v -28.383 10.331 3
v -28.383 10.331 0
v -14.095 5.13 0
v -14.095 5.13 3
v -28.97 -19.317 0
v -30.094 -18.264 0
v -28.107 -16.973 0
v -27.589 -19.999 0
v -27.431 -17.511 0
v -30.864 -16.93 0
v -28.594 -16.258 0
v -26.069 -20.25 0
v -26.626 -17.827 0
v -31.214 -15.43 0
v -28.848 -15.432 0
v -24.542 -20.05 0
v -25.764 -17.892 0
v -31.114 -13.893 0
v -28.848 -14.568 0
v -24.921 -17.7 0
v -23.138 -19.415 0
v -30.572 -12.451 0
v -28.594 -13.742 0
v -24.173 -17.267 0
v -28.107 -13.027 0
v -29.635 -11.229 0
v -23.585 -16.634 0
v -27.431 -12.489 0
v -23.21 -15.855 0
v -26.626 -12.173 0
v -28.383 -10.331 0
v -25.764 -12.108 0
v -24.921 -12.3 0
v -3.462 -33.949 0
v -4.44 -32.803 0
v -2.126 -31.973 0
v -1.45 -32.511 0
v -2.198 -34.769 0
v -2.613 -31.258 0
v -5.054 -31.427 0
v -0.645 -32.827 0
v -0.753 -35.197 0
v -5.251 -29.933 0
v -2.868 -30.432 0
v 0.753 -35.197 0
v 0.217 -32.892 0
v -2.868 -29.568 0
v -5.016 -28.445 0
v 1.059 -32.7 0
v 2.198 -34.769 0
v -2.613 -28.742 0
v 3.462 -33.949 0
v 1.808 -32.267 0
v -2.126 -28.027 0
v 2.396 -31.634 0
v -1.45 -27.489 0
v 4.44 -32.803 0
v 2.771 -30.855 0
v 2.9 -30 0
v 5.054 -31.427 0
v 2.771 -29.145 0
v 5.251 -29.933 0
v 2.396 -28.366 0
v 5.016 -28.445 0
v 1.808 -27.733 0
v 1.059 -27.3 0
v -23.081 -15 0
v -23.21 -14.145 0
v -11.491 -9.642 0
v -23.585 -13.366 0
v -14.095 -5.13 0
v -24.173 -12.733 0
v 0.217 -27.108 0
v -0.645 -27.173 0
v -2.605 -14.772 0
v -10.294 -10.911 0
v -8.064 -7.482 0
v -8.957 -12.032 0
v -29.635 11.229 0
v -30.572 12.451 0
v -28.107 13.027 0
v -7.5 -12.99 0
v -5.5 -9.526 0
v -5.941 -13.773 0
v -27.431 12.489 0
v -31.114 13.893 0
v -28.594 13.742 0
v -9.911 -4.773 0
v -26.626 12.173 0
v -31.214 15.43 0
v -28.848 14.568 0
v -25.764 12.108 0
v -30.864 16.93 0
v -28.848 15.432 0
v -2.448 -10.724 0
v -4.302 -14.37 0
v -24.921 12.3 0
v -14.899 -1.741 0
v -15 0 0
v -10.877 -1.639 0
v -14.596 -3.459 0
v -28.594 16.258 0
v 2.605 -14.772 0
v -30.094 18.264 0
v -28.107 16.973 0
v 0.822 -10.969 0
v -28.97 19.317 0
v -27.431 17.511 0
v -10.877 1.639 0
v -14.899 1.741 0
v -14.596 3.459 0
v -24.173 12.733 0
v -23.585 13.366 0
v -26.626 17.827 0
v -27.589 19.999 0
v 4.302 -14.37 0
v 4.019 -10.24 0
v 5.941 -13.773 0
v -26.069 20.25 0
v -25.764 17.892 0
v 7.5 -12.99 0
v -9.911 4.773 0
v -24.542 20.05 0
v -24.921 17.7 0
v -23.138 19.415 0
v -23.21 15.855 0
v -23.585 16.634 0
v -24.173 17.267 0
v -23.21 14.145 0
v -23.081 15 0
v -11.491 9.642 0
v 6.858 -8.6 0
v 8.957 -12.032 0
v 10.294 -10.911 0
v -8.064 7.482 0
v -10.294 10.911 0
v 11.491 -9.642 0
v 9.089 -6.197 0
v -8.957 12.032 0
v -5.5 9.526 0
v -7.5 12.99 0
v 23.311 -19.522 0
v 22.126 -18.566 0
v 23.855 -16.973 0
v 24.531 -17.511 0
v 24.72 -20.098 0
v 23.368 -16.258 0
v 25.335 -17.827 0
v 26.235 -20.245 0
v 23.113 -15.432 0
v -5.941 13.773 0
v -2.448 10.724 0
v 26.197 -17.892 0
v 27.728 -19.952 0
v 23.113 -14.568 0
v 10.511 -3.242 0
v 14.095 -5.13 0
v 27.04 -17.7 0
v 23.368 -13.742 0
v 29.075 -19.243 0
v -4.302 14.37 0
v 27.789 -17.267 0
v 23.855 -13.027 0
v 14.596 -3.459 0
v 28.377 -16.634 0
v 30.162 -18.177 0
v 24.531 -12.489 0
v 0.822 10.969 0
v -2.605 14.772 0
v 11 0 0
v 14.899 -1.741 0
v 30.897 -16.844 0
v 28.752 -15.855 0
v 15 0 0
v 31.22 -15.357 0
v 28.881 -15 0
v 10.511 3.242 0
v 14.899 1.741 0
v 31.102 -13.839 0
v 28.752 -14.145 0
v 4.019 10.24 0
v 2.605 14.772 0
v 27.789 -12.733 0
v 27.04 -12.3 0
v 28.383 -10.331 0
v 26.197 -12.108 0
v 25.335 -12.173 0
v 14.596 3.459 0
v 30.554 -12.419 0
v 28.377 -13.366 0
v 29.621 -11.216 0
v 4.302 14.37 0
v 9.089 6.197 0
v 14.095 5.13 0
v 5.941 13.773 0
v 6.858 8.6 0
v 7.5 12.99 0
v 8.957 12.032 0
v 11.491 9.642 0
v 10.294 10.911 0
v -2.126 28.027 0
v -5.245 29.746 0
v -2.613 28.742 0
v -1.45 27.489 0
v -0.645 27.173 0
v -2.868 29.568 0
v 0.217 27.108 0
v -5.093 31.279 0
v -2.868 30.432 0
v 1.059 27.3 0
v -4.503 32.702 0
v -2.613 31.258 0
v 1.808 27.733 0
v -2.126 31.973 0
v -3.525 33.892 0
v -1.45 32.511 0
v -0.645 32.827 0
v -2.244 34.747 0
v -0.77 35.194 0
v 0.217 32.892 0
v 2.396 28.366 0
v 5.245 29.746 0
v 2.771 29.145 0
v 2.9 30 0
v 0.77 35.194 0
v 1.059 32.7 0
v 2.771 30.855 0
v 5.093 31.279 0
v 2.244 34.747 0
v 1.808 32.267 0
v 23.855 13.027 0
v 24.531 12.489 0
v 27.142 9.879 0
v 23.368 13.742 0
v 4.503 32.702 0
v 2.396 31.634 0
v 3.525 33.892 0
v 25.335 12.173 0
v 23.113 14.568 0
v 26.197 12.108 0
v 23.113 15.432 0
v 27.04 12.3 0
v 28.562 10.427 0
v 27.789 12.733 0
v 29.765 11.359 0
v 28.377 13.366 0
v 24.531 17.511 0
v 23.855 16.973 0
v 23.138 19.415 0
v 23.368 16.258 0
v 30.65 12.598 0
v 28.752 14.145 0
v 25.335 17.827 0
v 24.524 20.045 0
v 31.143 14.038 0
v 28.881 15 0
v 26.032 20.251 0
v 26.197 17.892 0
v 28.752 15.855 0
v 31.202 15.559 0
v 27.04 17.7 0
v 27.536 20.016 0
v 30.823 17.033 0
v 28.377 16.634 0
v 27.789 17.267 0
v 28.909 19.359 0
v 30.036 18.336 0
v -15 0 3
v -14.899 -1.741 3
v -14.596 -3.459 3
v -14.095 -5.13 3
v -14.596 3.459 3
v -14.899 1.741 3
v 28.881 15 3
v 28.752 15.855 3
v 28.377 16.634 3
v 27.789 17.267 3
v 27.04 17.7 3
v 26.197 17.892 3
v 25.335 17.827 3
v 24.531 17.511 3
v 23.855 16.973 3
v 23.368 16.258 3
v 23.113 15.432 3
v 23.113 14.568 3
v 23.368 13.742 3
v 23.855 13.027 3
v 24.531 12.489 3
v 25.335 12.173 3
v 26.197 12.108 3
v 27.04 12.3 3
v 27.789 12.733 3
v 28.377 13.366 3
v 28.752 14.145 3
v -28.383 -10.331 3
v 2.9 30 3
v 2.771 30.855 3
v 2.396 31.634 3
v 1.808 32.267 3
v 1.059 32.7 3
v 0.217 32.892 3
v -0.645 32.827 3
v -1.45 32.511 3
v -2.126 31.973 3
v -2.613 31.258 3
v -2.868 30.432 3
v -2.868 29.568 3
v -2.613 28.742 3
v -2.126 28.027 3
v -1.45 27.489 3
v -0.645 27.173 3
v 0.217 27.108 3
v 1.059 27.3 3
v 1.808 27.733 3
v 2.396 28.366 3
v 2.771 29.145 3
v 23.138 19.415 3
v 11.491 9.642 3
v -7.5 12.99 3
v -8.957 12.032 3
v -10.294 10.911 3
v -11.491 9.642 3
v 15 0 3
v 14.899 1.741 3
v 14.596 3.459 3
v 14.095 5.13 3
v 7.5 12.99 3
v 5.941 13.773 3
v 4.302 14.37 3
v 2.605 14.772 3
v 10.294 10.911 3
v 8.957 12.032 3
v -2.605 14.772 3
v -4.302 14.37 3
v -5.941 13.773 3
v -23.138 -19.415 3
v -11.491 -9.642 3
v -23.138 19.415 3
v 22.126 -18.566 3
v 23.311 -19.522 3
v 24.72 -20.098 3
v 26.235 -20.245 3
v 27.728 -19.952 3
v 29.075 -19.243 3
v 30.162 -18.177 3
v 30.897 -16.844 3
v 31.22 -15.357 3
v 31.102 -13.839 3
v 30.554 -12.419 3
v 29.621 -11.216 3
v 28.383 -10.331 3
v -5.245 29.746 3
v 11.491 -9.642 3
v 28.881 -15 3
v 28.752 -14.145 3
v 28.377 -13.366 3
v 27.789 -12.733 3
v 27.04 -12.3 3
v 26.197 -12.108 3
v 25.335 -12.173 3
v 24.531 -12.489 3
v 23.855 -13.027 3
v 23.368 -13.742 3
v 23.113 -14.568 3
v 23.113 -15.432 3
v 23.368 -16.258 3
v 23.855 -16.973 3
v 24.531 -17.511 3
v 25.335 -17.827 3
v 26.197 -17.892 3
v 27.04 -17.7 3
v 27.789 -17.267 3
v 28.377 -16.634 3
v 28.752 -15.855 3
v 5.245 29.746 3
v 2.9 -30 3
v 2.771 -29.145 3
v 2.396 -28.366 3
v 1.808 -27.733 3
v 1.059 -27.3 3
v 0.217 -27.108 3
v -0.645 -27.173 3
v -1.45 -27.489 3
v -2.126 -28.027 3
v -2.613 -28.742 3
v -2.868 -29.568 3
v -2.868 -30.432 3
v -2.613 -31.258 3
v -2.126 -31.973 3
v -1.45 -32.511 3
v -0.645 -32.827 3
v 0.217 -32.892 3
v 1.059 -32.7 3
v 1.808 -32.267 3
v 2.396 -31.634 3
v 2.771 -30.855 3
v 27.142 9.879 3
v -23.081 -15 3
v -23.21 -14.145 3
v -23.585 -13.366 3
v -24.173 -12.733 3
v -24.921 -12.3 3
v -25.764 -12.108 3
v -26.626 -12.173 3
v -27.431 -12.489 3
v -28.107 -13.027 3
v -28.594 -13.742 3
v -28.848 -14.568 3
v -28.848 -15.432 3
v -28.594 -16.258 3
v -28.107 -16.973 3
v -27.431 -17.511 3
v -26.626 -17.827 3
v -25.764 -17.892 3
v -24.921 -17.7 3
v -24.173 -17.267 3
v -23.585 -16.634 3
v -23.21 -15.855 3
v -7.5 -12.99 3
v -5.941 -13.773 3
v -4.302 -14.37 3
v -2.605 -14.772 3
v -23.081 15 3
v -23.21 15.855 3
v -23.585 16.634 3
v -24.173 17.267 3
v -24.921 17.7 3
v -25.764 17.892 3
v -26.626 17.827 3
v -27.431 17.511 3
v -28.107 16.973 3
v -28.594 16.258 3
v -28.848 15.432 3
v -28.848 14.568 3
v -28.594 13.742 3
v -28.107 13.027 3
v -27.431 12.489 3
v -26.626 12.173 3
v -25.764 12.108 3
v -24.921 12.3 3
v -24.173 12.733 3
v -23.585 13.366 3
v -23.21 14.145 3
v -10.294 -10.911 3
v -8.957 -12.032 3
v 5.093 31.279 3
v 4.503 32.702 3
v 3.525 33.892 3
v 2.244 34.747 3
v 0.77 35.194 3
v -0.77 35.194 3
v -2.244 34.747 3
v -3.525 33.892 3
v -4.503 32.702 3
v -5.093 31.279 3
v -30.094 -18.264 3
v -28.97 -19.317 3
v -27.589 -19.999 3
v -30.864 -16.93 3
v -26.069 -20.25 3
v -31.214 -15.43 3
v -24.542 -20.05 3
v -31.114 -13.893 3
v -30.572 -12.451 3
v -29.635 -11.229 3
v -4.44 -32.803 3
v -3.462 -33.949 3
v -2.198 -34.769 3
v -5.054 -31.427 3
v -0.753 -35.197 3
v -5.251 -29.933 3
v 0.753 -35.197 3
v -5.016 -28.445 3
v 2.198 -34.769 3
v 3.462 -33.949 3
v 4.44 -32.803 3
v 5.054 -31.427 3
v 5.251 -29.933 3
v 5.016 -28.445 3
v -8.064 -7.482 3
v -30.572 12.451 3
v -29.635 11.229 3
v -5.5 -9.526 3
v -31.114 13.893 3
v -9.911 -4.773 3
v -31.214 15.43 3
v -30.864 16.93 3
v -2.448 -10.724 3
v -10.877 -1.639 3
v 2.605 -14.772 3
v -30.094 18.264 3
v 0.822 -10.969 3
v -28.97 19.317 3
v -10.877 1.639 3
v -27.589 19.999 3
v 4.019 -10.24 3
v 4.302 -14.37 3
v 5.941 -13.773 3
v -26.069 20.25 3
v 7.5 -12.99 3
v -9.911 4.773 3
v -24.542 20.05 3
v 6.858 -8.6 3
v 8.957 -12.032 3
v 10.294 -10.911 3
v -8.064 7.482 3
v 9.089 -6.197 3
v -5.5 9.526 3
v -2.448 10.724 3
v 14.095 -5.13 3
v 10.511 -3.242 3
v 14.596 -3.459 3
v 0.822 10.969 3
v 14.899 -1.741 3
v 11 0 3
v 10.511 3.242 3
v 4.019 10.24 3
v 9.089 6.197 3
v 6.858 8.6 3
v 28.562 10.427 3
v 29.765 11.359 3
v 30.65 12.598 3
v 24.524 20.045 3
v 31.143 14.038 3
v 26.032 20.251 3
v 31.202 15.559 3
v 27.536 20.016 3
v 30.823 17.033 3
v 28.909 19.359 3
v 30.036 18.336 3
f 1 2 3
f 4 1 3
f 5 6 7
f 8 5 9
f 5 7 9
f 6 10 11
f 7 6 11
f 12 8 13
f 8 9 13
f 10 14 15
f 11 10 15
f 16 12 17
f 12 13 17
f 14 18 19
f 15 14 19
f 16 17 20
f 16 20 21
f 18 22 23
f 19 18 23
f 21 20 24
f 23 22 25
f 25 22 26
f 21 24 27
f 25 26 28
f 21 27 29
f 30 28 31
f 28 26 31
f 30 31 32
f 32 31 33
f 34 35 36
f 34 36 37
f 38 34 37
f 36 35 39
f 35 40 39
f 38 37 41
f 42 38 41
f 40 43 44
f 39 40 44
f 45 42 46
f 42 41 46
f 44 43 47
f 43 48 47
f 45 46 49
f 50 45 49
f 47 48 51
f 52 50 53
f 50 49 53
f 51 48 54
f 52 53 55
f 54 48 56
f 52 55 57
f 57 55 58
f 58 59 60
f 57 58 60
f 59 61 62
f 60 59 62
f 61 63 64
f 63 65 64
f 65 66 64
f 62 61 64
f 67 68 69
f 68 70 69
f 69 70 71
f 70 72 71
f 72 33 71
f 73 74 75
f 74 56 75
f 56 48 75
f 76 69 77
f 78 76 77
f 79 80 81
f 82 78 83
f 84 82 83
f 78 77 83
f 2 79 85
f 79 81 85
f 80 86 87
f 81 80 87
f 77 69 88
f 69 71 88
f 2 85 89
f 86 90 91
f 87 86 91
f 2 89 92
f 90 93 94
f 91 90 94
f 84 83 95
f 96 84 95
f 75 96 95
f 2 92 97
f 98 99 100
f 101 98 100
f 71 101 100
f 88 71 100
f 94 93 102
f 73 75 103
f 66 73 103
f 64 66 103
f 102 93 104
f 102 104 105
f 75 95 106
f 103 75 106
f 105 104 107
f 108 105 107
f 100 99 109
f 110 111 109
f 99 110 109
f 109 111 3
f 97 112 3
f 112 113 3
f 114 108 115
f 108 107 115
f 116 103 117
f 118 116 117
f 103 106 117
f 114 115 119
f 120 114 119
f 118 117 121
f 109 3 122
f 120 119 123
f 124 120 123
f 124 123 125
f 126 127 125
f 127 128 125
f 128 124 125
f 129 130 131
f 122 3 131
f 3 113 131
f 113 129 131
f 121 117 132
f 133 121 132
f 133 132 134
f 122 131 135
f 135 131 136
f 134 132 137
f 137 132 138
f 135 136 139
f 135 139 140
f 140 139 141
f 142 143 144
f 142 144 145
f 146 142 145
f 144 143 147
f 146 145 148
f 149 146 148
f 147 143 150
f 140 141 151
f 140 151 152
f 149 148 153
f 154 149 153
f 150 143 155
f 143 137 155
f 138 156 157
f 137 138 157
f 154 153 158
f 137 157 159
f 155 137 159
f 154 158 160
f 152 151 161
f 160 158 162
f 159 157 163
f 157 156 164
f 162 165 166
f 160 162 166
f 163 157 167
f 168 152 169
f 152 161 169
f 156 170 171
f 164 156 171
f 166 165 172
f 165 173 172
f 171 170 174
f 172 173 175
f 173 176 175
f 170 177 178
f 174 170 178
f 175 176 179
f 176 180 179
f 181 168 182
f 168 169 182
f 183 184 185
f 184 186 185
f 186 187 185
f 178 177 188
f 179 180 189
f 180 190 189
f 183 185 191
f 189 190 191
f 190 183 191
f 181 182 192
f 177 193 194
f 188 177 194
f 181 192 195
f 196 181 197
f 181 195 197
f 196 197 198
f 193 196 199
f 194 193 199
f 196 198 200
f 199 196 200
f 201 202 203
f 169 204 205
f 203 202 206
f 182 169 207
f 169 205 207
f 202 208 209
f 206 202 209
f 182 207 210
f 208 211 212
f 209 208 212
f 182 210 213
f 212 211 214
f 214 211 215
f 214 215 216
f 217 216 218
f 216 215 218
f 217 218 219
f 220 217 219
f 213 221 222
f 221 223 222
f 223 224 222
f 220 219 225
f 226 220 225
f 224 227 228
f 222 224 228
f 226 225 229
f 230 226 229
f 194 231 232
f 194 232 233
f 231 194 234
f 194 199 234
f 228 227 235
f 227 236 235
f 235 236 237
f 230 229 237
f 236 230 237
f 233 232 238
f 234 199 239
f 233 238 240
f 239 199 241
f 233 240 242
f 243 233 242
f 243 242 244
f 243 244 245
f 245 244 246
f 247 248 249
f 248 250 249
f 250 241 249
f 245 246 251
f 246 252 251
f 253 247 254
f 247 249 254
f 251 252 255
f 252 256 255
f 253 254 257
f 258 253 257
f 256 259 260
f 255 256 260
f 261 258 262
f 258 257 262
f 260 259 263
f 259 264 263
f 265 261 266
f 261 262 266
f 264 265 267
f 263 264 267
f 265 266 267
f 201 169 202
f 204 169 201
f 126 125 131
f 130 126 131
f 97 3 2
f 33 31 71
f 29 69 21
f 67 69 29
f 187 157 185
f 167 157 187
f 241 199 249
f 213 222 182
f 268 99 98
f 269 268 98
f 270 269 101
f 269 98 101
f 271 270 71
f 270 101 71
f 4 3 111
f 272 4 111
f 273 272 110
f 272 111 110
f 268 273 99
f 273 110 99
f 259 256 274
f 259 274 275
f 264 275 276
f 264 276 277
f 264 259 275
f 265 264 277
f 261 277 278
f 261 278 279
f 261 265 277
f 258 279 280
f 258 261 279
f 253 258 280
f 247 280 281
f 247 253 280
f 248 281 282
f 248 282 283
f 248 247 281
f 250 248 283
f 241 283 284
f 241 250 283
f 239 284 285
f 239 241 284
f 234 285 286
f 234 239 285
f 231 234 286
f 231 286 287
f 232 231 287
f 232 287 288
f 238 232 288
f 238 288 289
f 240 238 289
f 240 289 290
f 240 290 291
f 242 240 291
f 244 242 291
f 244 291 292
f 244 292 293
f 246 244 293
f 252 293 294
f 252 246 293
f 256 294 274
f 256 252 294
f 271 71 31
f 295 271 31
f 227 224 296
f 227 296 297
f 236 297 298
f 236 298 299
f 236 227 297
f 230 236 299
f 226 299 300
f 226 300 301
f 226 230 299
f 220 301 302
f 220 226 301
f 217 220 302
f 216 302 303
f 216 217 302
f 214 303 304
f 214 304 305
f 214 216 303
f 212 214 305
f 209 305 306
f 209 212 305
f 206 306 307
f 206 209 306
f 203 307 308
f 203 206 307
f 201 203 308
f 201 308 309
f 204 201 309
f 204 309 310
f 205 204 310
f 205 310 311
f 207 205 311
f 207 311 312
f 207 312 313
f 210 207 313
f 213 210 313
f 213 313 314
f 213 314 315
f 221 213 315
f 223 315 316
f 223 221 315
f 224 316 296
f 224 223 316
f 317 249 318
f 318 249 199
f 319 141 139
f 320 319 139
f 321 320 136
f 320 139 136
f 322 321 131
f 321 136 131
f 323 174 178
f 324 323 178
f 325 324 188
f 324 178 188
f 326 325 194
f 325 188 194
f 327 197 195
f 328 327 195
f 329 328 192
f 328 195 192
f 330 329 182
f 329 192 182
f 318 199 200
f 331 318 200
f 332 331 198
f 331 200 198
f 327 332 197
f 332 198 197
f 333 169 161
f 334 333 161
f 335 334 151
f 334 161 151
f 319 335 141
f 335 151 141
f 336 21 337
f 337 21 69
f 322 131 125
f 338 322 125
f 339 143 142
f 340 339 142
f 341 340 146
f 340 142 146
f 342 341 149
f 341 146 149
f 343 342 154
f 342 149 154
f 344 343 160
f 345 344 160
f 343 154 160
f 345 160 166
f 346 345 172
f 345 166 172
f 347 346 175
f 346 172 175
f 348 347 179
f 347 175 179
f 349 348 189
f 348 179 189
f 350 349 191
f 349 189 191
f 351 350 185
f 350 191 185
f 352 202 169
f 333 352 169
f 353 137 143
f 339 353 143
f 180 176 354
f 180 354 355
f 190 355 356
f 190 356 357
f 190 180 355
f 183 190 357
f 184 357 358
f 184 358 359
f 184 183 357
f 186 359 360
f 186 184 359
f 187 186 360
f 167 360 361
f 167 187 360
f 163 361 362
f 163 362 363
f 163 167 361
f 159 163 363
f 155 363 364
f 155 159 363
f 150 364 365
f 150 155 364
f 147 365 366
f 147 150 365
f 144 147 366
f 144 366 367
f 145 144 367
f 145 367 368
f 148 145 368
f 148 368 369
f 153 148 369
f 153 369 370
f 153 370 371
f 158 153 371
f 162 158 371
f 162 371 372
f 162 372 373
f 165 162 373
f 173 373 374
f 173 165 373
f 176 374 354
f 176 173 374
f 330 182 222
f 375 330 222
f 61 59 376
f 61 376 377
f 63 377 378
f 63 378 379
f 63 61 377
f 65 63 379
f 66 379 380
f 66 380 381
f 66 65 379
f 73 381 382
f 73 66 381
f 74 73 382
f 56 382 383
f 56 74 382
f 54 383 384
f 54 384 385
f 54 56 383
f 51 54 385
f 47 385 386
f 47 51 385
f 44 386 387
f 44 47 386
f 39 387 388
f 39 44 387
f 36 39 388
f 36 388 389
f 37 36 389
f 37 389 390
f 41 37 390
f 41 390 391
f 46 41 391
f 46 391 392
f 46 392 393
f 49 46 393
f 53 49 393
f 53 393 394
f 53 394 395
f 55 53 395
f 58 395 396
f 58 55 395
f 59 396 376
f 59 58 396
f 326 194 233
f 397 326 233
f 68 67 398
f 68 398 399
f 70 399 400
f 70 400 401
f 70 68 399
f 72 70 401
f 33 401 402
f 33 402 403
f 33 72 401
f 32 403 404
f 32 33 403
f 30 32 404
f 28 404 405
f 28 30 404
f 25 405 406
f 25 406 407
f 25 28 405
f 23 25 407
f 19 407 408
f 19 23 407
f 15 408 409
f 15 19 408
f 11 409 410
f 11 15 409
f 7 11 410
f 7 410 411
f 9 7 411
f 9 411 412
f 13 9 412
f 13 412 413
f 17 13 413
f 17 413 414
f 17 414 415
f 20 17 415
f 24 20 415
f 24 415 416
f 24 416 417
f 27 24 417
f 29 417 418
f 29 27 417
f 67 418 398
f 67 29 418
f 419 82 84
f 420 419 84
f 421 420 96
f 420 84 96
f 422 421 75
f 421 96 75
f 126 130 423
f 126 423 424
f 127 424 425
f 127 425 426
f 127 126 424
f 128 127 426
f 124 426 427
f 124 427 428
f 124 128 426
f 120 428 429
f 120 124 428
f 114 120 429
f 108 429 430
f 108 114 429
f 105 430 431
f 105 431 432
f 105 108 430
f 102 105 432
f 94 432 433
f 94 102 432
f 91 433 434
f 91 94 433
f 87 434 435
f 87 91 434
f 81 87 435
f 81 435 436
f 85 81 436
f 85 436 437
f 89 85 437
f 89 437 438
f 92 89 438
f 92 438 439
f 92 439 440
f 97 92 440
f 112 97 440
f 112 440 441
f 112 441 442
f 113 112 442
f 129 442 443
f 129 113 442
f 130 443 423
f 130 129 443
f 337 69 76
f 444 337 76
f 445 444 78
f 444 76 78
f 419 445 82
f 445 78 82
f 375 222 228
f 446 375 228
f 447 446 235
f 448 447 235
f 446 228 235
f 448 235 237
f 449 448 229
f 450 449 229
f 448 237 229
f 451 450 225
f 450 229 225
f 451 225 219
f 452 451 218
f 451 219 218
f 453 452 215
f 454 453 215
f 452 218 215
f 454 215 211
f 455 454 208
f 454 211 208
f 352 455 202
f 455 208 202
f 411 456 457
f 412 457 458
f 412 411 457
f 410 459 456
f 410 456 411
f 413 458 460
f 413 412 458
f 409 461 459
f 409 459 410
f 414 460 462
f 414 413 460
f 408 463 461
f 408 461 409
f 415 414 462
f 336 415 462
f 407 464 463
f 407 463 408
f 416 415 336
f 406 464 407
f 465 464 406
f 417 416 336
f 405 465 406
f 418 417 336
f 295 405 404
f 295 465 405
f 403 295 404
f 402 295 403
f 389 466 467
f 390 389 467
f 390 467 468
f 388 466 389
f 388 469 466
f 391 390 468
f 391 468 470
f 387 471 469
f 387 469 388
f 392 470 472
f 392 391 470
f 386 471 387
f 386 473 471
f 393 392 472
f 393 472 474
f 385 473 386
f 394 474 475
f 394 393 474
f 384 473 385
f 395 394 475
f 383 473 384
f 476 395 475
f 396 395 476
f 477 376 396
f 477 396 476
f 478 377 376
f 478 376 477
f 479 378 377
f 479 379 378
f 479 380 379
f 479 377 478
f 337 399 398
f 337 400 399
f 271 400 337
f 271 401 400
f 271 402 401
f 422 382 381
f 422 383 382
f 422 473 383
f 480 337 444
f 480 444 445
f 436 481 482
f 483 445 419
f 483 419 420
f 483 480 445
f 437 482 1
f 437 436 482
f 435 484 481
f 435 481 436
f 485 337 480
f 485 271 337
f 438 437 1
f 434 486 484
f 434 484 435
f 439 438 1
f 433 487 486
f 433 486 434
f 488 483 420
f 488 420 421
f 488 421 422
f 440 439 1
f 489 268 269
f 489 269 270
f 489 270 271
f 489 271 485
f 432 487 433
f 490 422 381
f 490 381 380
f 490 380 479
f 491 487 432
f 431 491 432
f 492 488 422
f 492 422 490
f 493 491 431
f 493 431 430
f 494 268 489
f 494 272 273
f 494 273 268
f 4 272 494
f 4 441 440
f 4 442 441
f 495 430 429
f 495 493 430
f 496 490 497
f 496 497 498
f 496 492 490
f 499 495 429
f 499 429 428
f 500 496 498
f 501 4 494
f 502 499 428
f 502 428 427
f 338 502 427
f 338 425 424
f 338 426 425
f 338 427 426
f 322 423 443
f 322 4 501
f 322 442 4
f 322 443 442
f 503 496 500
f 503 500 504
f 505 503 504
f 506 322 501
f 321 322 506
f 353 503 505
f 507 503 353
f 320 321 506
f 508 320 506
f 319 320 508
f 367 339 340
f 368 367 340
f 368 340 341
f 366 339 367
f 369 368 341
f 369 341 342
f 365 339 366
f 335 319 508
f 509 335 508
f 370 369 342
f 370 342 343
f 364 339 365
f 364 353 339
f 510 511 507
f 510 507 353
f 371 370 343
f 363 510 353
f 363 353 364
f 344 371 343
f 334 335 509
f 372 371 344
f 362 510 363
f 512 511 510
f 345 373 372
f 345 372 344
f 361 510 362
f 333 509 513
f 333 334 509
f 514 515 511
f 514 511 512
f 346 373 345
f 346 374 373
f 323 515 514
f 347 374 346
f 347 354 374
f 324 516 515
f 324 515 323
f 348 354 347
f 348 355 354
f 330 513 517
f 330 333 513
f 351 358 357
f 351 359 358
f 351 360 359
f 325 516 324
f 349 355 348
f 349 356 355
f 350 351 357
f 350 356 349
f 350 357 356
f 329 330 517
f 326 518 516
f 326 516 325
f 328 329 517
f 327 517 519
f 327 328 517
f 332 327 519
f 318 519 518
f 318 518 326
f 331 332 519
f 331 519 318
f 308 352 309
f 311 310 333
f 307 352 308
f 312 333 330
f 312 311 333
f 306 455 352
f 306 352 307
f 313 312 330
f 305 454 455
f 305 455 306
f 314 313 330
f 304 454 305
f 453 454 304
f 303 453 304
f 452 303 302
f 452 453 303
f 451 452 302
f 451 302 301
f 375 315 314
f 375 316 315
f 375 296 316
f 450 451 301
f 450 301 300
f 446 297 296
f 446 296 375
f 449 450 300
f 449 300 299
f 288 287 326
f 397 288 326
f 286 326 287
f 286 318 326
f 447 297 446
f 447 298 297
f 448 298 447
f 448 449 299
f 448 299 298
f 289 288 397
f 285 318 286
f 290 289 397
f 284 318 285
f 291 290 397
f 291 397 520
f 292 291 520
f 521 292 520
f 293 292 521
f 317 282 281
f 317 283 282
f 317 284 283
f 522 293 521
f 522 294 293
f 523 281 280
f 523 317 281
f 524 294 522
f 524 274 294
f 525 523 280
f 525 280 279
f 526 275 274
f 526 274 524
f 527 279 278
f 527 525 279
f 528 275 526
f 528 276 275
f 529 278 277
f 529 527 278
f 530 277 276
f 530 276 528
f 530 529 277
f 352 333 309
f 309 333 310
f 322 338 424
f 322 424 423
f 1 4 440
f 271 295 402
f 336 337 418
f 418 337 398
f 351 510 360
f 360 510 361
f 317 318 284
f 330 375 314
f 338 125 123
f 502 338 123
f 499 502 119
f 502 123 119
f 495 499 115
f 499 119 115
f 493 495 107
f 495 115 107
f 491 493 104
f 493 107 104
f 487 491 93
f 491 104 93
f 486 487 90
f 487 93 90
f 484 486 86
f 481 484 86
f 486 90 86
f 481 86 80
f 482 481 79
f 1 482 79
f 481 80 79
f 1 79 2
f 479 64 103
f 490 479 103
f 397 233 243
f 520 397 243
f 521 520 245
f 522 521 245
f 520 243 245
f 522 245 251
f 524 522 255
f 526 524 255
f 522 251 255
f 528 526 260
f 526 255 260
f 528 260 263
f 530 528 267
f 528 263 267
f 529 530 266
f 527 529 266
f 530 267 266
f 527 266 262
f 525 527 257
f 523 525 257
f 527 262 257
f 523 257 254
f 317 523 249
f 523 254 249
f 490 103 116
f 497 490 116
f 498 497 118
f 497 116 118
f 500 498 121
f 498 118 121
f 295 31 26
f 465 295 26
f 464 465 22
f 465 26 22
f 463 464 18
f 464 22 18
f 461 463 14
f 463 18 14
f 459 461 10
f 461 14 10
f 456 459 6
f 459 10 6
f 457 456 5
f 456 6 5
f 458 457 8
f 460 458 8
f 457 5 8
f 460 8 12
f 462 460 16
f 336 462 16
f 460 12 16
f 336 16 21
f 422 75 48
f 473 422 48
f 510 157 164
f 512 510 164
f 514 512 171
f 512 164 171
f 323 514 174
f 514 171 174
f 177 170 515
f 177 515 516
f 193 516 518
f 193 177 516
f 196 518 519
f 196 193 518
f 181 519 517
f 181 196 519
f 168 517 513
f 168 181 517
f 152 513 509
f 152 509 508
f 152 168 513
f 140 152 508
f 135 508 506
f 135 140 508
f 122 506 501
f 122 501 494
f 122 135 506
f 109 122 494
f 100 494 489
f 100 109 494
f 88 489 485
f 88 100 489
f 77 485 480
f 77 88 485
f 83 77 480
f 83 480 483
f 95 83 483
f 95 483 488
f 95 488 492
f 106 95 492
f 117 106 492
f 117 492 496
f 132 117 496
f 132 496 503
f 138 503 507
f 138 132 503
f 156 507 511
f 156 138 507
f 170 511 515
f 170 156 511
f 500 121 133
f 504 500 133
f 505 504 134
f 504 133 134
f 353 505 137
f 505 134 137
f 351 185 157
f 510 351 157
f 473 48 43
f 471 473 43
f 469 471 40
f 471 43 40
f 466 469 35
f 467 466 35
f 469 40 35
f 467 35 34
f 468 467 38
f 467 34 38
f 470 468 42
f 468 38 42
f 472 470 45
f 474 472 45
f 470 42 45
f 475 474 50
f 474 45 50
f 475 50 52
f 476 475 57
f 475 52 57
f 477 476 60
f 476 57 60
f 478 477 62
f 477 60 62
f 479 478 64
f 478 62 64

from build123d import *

# Parameters (mm, degrees)
F0_R     = 2.9
F0_R_2   = 11
F1_DEPTH = 3


with BuildPart() as f1:
    # F0 (on Top) → F1 (new body)
    with BuildSketch(Plane.XY):
        with BuildLine():
            Line((-5.24501, 29.745933), (-2.604723, 14.772116))
            ThreePointArc((-2.604723, 14.772116), (-5.130302, 14.095389), (-7.5, 12.990381))
            ThreePointArc((-7.5, 12.990381), (-9.641814, 11.490667), (-11.490667, 9.641814))
            Line((-11.490667, 9.641814), (-23.138228, 19.415279))
            ThreePointArc((-23.138228, 19.415279), (-30.5284, 17.62558), (-28.383239, 10.330654))
            Line((-28.383239, 10.330654), (-14.095389, 5.130302))
            ThreePointArc((-14.095389, 5.130302), (-14.772116, 2.604723), (-15, 0))
            ThreePointArc((-15, 0), (-14.772116, -2.604723), (-14.095389, -5.130302))
            Line((-14.095389, -5.130302), (-28.383239, -10.330654))
            ThreePointArc((-28.383239, -10.330654), (-30.5284, -17.62558), (-23.138228, -19.415279))
            Line((-23.138228, -19.415279), (-11.490667, -9.641814))
            ThreePointArc((-11.490667, -9.641814), (-9.641814, -11.490667), (-7.5, -12.990381))
            ThreePointArc((-7.5, -12.990381), (-5.130302, -14.095389), (-2.604723, -14.772116))
            Line((-2.604723, -14.772116), (-5.015594, -28.444846))
            ThreePointArc((-5.015594, -28.444846), (0, -35.25116), (5.015594, -28.444846))
            Line((5.015594, -28.444846), (2.604723, -14.772116))
            ThreePointArc((2.604723, -14.772116), (5.130302, -14.095389), (7.5, -12.990381))
            ThreePointArc((7.5, -12.990381), (9.641814, -11.490667), (11.490667, -9.641814))
            Line((11.490667, -9.641814), (22.126162, -18.566055))
            ThreePointArc((22.126162, -18.566055), (30.161985, -18.176801), (28.383239, -10.330654))
            Line((28.383239, -10.330654), (14.095389, -5.130302))
            ThreePointArc((14.095389, -5.130302), (14.772116, -2.604723), (15, 0))
            ThreePointArc((15, 0), (14.772116, 2.604723), (14.095389, 5.130302))
            Line((14.095389, 5.130302), (27.141756, 9.878791))
            ThreePointArc((27.141756, 9.878791), (30.822564, 17.032644), (23.138228, 19.415279))
            Line((23.138228, 19.415279), (11.490667, 9.641814))
            ThreePointArc((11.490667, 9.641814), (9.641814, 11.490667), (7.5, 12.990381))
            ThreePointArc((7.5, 12.990381), (5.130302, 14.095389), (2.604723, 14.772116))
            Line((2.604723, 14.772116), (5.24501, 29.745933))
            ThreePointArc((5.24501, 29.745933), (0, 35.25116), (-5.24501, 29.745933))
        make_face()
        with Locations((0, -30)):
            Circle(F0_R, mode=Mode.SUBTRACT)
        with Locations((-25.980762, -15)):
            Circle(F0_R, mode=Mode.SUBTRACT)
        with Locations((25.980762, -15)):
            Circle(F0_R, mode=Mode.SUBTRACT)
        with Locations((-25.980762, 15)):
            Circle(F0_R, mode=Mode.SUBTRACT)
        Circle(F0_R_2, mode=Mode.SUBTRACT)
        with Locations((0, 30)):
            Circle(F0_R, mode=Mode.SUBTRACT)
        with Locations((25.980762, 15)):
            Circle(F0_R, mode=Mode.SUBTRACT)
    extrude(amount=F1_DEPTH)


solid = f1.part
